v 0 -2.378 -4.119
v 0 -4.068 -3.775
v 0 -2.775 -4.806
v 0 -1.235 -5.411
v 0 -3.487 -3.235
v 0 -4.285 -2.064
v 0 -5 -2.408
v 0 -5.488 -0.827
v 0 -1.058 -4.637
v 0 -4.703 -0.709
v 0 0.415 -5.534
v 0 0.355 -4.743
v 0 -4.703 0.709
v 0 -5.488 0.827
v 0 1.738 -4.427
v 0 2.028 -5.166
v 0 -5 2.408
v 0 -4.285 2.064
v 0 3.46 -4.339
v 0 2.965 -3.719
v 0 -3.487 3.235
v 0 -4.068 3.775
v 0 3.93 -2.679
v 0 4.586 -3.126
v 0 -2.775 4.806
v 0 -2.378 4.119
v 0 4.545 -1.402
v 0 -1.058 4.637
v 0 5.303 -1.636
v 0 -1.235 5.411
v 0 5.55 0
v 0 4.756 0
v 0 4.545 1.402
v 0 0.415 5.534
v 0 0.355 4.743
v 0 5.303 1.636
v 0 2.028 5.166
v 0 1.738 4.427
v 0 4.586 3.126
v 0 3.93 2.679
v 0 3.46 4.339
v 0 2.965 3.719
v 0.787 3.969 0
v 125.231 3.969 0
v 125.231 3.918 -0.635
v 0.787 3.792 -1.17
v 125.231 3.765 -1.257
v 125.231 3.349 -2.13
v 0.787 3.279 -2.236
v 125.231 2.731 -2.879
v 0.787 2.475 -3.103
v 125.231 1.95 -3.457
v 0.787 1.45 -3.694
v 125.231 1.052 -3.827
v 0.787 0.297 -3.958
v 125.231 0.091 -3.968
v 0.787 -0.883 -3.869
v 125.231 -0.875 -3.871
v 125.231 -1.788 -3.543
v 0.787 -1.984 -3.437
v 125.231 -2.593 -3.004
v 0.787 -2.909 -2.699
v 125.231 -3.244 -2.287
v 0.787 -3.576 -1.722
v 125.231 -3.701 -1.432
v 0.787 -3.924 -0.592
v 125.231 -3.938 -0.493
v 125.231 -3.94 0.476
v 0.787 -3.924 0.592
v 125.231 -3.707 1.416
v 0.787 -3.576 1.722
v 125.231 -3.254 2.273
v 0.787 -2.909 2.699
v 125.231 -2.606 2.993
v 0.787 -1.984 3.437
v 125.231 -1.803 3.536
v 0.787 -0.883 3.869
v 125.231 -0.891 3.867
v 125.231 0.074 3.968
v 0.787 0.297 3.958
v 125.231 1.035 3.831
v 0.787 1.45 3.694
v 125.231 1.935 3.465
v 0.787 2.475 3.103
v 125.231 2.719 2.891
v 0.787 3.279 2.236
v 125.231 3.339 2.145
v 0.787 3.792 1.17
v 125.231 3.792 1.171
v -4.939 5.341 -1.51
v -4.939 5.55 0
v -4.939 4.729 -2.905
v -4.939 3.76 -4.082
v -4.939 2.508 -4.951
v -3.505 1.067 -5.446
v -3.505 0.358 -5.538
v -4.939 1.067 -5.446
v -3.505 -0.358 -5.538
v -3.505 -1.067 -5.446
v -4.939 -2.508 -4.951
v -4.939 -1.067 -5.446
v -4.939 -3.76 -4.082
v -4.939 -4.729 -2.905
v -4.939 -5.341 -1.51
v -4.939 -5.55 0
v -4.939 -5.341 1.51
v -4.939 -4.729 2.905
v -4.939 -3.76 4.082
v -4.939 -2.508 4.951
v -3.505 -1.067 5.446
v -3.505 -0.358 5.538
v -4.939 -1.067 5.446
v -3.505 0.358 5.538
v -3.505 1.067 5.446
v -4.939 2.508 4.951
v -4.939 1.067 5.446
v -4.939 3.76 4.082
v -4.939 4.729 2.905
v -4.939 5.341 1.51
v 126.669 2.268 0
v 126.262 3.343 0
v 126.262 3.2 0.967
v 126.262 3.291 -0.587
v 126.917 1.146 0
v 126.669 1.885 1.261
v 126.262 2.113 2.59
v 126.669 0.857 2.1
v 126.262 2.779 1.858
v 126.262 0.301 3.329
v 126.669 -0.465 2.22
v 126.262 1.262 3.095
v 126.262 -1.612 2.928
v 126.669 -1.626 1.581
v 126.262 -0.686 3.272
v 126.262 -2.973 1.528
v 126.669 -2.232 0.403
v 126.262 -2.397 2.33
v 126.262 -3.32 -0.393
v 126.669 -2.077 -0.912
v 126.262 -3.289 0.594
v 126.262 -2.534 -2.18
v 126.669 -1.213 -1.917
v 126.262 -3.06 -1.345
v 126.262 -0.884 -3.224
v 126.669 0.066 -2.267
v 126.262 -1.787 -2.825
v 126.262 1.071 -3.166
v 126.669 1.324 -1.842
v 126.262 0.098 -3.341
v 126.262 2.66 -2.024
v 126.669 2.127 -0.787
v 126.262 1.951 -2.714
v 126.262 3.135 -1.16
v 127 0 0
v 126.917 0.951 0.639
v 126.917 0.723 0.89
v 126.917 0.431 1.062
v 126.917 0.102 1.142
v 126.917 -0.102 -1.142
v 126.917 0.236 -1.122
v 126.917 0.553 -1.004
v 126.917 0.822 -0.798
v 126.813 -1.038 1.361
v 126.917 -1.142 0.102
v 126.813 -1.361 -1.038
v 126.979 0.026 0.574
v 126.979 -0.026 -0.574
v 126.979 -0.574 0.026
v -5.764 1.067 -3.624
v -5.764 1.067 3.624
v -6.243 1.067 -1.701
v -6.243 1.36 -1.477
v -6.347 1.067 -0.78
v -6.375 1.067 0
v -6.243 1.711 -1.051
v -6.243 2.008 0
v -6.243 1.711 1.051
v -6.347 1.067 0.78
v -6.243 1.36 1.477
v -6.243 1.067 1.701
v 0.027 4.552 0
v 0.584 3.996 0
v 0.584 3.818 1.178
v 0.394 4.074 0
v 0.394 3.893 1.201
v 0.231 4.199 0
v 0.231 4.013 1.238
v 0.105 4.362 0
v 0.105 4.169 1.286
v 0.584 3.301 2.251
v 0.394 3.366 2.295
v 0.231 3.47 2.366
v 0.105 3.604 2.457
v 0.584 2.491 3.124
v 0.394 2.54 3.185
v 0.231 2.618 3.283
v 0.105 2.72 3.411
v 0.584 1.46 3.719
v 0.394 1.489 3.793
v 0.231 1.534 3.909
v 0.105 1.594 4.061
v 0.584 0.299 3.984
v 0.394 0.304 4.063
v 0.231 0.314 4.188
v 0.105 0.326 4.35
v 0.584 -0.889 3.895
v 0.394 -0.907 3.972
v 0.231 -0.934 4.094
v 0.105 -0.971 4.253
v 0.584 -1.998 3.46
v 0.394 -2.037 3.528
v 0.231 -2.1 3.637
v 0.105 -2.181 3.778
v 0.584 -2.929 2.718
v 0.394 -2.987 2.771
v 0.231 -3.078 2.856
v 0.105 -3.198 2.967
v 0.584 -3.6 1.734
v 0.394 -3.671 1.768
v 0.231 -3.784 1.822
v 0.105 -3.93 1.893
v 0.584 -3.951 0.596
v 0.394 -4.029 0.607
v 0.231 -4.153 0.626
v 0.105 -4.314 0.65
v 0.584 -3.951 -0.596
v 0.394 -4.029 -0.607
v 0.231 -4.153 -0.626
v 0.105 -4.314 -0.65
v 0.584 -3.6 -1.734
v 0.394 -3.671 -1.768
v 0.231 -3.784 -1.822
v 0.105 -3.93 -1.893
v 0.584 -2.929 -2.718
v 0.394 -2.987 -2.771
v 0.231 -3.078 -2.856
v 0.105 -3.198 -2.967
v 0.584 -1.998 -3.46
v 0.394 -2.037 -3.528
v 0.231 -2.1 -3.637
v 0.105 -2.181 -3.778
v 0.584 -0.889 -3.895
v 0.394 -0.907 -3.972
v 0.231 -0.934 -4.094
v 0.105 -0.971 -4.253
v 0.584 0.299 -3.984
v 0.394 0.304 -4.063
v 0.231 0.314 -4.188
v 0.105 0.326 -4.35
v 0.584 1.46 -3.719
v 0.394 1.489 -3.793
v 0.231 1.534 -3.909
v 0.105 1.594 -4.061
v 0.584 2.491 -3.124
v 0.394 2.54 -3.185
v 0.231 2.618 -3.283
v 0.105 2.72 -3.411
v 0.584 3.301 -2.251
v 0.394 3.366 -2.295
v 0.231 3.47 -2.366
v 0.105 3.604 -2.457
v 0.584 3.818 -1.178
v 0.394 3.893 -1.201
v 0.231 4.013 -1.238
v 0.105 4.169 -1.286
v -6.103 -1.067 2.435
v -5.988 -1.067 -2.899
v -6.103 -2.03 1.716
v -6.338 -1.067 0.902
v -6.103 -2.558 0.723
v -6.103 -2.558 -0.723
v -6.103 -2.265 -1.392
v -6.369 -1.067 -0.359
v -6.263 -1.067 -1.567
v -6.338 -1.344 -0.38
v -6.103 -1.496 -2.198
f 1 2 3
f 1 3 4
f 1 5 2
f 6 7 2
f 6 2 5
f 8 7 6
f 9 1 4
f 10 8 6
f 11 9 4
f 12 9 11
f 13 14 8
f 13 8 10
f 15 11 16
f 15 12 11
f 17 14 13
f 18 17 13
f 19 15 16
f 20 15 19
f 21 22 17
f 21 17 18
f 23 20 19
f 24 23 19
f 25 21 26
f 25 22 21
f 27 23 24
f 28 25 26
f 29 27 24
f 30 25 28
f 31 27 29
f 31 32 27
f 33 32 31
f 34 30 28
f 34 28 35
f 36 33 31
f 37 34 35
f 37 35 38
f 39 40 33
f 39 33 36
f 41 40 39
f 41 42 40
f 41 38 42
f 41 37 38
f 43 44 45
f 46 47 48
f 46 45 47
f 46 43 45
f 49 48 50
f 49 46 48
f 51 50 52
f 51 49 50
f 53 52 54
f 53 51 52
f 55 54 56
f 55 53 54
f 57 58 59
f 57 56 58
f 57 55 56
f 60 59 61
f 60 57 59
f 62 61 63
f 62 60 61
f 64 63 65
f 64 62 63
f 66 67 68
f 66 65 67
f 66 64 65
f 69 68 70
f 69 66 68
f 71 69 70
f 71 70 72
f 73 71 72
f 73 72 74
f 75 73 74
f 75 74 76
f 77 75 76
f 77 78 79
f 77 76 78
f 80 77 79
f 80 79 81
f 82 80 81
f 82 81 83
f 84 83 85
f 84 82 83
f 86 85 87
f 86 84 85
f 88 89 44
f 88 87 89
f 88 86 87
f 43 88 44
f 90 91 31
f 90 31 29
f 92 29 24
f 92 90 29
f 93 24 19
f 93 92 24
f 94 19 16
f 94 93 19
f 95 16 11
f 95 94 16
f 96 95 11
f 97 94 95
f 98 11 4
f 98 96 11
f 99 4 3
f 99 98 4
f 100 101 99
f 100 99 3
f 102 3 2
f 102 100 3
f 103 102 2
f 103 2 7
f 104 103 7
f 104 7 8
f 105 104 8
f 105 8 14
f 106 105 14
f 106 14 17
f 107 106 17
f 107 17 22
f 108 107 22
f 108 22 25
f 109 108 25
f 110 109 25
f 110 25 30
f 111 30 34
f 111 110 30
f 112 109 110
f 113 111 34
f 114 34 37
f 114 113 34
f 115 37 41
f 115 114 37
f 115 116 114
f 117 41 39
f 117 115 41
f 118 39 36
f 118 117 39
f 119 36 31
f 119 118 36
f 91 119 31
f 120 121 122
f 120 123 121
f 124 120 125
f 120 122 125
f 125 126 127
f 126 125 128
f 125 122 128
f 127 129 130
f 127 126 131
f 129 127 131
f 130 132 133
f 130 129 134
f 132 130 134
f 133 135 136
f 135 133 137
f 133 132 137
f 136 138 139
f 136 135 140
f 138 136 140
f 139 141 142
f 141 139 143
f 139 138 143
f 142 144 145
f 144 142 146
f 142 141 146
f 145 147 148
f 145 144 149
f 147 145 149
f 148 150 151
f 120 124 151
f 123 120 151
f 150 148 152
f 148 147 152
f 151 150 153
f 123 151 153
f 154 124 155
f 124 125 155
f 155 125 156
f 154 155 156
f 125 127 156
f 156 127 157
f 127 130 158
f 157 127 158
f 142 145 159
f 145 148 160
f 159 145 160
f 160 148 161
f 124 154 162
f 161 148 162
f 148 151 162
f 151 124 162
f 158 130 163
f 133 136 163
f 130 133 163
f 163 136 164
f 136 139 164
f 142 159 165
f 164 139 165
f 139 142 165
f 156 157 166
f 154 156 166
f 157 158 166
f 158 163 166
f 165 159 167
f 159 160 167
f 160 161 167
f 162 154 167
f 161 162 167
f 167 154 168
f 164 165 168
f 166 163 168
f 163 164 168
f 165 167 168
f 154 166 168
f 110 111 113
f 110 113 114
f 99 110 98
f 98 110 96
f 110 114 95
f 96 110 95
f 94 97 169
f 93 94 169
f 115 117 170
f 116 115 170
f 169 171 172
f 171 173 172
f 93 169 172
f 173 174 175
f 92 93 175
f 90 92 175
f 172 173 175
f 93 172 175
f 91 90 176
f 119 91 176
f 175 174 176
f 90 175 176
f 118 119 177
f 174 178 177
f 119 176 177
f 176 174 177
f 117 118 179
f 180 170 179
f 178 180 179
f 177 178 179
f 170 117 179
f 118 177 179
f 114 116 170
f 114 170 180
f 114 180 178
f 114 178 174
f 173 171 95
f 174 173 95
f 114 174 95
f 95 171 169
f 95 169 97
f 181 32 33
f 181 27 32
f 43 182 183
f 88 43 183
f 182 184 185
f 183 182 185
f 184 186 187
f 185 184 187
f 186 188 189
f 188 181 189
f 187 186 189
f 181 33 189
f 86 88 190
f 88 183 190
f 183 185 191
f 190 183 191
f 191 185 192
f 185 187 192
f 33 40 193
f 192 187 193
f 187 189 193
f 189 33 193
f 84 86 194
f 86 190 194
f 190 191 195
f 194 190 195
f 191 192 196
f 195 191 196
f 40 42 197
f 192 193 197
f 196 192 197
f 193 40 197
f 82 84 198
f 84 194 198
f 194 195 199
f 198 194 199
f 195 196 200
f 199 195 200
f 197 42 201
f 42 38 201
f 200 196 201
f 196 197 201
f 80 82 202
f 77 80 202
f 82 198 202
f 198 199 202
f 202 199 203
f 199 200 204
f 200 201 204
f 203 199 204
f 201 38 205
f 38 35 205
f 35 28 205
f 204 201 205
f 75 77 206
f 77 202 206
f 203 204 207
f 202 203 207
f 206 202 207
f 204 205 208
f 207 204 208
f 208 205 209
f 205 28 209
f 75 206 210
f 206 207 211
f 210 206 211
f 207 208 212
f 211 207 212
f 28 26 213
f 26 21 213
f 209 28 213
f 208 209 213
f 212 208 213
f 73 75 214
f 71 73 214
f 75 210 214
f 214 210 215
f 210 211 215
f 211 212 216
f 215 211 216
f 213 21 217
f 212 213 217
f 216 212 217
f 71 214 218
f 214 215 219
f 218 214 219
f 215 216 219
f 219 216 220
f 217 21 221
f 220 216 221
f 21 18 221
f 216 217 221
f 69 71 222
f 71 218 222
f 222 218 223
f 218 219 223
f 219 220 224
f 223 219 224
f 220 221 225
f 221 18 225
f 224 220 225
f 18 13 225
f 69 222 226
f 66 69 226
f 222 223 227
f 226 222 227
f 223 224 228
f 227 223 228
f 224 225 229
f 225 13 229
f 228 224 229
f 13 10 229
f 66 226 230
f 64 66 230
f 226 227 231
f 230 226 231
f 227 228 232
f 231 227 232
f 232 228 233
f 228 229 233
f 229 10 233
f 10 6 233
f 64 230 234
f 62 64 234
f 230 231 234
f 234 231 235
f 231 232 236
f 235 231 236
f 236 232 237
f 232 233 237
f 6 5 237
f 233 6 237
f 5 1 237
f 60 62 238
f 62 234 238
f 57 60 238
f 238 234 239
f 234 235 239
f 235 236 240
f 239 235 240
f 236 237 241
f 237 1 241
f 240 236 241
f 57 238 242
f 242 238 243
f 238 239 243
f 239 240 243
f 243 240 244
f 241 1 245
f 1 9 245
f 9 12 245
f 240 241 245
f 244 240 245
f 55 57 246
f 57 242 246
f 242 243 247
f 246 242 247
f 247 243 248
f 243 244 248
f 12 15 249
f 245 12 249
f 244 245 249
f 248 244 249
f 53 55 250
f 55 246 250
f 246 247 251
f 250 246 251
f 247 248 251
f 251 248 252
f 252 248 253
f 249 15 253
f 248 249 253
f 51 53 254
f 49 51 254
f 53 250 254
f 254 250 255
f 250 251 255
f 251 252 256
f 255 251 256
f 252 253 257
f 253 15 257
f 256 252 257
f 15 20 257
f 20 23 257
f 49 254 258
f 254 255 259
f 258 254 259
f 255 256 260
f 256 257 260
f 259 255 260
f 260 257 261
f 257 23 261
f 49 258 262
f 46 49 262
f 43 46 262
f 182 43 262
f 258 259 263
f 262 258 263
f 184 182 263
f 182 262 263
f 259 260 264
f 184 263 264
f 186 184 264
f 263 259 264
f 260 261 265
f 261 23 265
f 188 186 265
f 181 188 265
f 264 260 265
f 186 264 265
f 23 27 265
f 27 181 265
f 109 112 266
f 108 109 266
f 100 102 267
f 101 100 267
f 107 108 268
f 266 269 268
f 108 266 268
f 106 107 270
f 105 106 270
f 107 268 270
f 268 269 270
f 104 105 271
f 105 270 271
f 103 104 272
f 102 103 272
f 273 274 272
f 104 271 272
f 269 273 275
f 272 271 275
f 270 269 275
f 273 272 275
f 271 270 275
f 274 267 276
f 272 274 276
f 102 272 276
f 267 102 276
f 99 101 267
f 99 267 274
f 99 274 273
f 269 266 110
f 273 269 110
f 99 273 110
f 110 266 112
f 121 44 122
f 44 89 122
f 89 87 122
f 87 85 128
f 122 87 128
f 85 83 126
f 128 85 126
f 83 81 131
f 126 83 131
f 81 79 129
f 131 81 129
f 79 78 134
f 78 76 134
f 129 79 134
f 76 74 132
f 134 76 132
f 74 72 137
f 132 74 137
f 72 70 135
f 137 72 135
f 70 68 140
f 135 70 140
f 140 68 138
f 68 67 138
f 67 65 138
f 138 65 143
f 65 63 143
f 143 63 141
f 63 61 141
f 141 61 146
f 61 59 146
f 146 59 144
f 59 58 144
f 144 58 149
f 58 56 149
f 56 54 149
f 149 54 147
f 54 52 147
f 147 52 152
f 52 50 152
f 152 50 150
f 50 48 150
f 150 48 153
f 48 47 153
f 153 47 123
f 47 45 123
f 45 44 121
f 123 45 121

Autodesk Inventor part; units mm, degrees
ref_plane "YZ Plane" through (0, 0, 0) normal (1, 0, 0) x (0, 1, 0)
sketch "Szkic1" plane through (0, 0, 0) normal (0, 0, 1) x (1, 0, 0)
  line L0 (-6.4262, 0) -> (127, 0)
  line L1 (127, 0) -> (127, 3.9688)
  line L2 (127, 3.9688) -> (104.775, 3.9688)
  line L3 (104.775, 3.9688) -> (103.9282, 3.9688)
  line L4 (103.9282, 3.9688) -> (0, 3.9688)
  line L5 (0, 3.9688) -> (0, 5.5499)
  line L6 (-33.5498, 0) -> (153.7583, 0) projected
  line L7 (0, -1.1296) -> (0, 6.7773) projected
  line L8 (0, 5.5499) -> (-4.9391, 5.5499)
  arc A0 (-4.9391, 5.5499) -> (-6.4262, 0) centre (4.6736, 0) ccw
  line L9 (104.775, 3.9688) -> (0, 3.9687) construction
  dimension "d0" = 127
  dimension "d1" = 22.225
  dimension "d2" = 0.8468
  dimension "d3" = 6.4262
  dimension "d4" = 7.9375
  dimension "d5" = 7.9375
  dimension "d9" = 11.0998
  dimension "d10" = 0
  dimension "d13" = 11.0998
revolve "Bryła" add sketch "Szkic1" angle 360 about axis through (-6.4262, 0, 0) along (1, 0, 0)
ref_plane "IDS_WORKPLANE{1}" through (-6.4262, 0, 0) normal (1, 0, 0) x (0, 0, -1)
sketch "Szkic2" plane through (-6.4262, 0, 0) normal (1, 0, 0) x (0, 0, -1)
  circle A0 centre (0, 0) radius 5.5499 projected
  line L0 (0, -7.7699) -> (0, 7.7699) projected
  line L1 (7.7699, 0) -> (-7.7699, 0) projected
  line L2 (-5.5499, 1.0668) -> (5.5499, 1.0668)
  line L3 (5.5499, 1.0668) -> (5.5499, -1.0668)
  line L4 (5.5499, -1.0668) -> (-5.5499, -1.0668)
  line L5 (-5.5499, -1.0668) -> (-5.5499, 1.0668)
  line L6 (-5.5499, 0) -> (5.5499, 0) construction
  line L7 (0, 1.0668) -> (0, -1.0668) construction
  dimension "d15" = 2.1336
extrude "Szczelina" cut sketch "Szkic2" along normal blind 2.921 contours L1 L0 L2 A0 | L3 L4 A0 | A0 L4 L0 L1 | A0 L2 L3 | L1 A0 L2 L0 | L0 L4 A0 L1 | L5 L2 A0 | A0 L4 L5
thread "Gwint" size "5/16-18 UNC" class "2A" standard "ANSI Unified Screw Threads" length 22.225
sketch "Szkic3" plane through (0, 0, 0) normal (0, 0, 1) x (1, 0, 0)
  line L0 (127, 0) -> (127, 3.9688) projected
  line L1 (127, 3.9688) -> (104.775, 3.9688) projected
  line L2 (-6.4262, 0) -> (127, 0) projected
  arc A0 (127, 0) -> (125.9366, 3.9688) centre (119.0625, 0) ccw
  line L3 (127, -3.9688) -> (127, 3.9688) projected
  line L4 (125.9366, 3.9688) -> (125.9366, 0)
  line L5 (125.9366, 0) -> (127, 0)
  dimension "d40" = 7.9375
revolve "Zaokrąglenie1" cut sketch "Szkic3" angle 360 about axis through (-6.4262, 0, 0) along (1, 0, 0) contours A0 L1 L0
chamfer "Faza" distance 0.7056 angle 45 1 edges at (125.9366, -3.9688, 0)
ref_plane "Work Plane2" through (41.275, 0, 0) normal (0, 0, -1) x (1, 0, 0)
fillet "Zaokrąglenie4" radius 0.7874 1 edges at (0, -3.9688, 0)
equation "\"d0\" = NLG"
equation "\"d1\" = GEL"
equation "\"d2\" = GAL"
equation "\"d3\" = KOH"
equation "\"d4\" = GD"
equation "\"d5\" = BDM"
equation "\"d9\" = KOD"
equation "\"d13\" = KR"
equation "\"d15\" = SBR"
equation "\"d16\" = STI"
equation "\"d40\" = GD"
equation "\"d11\" = GEL"
equation "\"d43\" = 0.5 * RR"
equation "\"d46\" = R"
equation "\"GD\" = NND"
equation "\"NLG\" = 127"
equation "\"GEL\" = 22.225"
equation "\"KOD\" = 11.0998"
equation "\"KOH\" = 6.4262"
equation "\"GAL\" = 0.84684"
equation "\"BDM\" = NND"
equation "\"SBR\" = 2.1336"
equation "\"STI\" = 2.921"
equation "\"KEWI\" = 0"
equation "\"KR\" = KOD"
equation "\"d14\" = -KOH"
equation "\"R\" = 0.7874"
equation "\"THREADDIA\" = 7.9375"
equation "\"TOA\" = 30deg"
equation "\"KOH1\" = 5.1562"
equation "\"NND\" = 7.9375"
equation "\"GD1\" = 6.25856"
equation "\"THREADDESC\" = 1.2345"
equation "\"RR\" = 1.411111"
properties part number "ANSI B18.6.2 - 5/16-18 UNC - 5" material "Stal, miękka"
